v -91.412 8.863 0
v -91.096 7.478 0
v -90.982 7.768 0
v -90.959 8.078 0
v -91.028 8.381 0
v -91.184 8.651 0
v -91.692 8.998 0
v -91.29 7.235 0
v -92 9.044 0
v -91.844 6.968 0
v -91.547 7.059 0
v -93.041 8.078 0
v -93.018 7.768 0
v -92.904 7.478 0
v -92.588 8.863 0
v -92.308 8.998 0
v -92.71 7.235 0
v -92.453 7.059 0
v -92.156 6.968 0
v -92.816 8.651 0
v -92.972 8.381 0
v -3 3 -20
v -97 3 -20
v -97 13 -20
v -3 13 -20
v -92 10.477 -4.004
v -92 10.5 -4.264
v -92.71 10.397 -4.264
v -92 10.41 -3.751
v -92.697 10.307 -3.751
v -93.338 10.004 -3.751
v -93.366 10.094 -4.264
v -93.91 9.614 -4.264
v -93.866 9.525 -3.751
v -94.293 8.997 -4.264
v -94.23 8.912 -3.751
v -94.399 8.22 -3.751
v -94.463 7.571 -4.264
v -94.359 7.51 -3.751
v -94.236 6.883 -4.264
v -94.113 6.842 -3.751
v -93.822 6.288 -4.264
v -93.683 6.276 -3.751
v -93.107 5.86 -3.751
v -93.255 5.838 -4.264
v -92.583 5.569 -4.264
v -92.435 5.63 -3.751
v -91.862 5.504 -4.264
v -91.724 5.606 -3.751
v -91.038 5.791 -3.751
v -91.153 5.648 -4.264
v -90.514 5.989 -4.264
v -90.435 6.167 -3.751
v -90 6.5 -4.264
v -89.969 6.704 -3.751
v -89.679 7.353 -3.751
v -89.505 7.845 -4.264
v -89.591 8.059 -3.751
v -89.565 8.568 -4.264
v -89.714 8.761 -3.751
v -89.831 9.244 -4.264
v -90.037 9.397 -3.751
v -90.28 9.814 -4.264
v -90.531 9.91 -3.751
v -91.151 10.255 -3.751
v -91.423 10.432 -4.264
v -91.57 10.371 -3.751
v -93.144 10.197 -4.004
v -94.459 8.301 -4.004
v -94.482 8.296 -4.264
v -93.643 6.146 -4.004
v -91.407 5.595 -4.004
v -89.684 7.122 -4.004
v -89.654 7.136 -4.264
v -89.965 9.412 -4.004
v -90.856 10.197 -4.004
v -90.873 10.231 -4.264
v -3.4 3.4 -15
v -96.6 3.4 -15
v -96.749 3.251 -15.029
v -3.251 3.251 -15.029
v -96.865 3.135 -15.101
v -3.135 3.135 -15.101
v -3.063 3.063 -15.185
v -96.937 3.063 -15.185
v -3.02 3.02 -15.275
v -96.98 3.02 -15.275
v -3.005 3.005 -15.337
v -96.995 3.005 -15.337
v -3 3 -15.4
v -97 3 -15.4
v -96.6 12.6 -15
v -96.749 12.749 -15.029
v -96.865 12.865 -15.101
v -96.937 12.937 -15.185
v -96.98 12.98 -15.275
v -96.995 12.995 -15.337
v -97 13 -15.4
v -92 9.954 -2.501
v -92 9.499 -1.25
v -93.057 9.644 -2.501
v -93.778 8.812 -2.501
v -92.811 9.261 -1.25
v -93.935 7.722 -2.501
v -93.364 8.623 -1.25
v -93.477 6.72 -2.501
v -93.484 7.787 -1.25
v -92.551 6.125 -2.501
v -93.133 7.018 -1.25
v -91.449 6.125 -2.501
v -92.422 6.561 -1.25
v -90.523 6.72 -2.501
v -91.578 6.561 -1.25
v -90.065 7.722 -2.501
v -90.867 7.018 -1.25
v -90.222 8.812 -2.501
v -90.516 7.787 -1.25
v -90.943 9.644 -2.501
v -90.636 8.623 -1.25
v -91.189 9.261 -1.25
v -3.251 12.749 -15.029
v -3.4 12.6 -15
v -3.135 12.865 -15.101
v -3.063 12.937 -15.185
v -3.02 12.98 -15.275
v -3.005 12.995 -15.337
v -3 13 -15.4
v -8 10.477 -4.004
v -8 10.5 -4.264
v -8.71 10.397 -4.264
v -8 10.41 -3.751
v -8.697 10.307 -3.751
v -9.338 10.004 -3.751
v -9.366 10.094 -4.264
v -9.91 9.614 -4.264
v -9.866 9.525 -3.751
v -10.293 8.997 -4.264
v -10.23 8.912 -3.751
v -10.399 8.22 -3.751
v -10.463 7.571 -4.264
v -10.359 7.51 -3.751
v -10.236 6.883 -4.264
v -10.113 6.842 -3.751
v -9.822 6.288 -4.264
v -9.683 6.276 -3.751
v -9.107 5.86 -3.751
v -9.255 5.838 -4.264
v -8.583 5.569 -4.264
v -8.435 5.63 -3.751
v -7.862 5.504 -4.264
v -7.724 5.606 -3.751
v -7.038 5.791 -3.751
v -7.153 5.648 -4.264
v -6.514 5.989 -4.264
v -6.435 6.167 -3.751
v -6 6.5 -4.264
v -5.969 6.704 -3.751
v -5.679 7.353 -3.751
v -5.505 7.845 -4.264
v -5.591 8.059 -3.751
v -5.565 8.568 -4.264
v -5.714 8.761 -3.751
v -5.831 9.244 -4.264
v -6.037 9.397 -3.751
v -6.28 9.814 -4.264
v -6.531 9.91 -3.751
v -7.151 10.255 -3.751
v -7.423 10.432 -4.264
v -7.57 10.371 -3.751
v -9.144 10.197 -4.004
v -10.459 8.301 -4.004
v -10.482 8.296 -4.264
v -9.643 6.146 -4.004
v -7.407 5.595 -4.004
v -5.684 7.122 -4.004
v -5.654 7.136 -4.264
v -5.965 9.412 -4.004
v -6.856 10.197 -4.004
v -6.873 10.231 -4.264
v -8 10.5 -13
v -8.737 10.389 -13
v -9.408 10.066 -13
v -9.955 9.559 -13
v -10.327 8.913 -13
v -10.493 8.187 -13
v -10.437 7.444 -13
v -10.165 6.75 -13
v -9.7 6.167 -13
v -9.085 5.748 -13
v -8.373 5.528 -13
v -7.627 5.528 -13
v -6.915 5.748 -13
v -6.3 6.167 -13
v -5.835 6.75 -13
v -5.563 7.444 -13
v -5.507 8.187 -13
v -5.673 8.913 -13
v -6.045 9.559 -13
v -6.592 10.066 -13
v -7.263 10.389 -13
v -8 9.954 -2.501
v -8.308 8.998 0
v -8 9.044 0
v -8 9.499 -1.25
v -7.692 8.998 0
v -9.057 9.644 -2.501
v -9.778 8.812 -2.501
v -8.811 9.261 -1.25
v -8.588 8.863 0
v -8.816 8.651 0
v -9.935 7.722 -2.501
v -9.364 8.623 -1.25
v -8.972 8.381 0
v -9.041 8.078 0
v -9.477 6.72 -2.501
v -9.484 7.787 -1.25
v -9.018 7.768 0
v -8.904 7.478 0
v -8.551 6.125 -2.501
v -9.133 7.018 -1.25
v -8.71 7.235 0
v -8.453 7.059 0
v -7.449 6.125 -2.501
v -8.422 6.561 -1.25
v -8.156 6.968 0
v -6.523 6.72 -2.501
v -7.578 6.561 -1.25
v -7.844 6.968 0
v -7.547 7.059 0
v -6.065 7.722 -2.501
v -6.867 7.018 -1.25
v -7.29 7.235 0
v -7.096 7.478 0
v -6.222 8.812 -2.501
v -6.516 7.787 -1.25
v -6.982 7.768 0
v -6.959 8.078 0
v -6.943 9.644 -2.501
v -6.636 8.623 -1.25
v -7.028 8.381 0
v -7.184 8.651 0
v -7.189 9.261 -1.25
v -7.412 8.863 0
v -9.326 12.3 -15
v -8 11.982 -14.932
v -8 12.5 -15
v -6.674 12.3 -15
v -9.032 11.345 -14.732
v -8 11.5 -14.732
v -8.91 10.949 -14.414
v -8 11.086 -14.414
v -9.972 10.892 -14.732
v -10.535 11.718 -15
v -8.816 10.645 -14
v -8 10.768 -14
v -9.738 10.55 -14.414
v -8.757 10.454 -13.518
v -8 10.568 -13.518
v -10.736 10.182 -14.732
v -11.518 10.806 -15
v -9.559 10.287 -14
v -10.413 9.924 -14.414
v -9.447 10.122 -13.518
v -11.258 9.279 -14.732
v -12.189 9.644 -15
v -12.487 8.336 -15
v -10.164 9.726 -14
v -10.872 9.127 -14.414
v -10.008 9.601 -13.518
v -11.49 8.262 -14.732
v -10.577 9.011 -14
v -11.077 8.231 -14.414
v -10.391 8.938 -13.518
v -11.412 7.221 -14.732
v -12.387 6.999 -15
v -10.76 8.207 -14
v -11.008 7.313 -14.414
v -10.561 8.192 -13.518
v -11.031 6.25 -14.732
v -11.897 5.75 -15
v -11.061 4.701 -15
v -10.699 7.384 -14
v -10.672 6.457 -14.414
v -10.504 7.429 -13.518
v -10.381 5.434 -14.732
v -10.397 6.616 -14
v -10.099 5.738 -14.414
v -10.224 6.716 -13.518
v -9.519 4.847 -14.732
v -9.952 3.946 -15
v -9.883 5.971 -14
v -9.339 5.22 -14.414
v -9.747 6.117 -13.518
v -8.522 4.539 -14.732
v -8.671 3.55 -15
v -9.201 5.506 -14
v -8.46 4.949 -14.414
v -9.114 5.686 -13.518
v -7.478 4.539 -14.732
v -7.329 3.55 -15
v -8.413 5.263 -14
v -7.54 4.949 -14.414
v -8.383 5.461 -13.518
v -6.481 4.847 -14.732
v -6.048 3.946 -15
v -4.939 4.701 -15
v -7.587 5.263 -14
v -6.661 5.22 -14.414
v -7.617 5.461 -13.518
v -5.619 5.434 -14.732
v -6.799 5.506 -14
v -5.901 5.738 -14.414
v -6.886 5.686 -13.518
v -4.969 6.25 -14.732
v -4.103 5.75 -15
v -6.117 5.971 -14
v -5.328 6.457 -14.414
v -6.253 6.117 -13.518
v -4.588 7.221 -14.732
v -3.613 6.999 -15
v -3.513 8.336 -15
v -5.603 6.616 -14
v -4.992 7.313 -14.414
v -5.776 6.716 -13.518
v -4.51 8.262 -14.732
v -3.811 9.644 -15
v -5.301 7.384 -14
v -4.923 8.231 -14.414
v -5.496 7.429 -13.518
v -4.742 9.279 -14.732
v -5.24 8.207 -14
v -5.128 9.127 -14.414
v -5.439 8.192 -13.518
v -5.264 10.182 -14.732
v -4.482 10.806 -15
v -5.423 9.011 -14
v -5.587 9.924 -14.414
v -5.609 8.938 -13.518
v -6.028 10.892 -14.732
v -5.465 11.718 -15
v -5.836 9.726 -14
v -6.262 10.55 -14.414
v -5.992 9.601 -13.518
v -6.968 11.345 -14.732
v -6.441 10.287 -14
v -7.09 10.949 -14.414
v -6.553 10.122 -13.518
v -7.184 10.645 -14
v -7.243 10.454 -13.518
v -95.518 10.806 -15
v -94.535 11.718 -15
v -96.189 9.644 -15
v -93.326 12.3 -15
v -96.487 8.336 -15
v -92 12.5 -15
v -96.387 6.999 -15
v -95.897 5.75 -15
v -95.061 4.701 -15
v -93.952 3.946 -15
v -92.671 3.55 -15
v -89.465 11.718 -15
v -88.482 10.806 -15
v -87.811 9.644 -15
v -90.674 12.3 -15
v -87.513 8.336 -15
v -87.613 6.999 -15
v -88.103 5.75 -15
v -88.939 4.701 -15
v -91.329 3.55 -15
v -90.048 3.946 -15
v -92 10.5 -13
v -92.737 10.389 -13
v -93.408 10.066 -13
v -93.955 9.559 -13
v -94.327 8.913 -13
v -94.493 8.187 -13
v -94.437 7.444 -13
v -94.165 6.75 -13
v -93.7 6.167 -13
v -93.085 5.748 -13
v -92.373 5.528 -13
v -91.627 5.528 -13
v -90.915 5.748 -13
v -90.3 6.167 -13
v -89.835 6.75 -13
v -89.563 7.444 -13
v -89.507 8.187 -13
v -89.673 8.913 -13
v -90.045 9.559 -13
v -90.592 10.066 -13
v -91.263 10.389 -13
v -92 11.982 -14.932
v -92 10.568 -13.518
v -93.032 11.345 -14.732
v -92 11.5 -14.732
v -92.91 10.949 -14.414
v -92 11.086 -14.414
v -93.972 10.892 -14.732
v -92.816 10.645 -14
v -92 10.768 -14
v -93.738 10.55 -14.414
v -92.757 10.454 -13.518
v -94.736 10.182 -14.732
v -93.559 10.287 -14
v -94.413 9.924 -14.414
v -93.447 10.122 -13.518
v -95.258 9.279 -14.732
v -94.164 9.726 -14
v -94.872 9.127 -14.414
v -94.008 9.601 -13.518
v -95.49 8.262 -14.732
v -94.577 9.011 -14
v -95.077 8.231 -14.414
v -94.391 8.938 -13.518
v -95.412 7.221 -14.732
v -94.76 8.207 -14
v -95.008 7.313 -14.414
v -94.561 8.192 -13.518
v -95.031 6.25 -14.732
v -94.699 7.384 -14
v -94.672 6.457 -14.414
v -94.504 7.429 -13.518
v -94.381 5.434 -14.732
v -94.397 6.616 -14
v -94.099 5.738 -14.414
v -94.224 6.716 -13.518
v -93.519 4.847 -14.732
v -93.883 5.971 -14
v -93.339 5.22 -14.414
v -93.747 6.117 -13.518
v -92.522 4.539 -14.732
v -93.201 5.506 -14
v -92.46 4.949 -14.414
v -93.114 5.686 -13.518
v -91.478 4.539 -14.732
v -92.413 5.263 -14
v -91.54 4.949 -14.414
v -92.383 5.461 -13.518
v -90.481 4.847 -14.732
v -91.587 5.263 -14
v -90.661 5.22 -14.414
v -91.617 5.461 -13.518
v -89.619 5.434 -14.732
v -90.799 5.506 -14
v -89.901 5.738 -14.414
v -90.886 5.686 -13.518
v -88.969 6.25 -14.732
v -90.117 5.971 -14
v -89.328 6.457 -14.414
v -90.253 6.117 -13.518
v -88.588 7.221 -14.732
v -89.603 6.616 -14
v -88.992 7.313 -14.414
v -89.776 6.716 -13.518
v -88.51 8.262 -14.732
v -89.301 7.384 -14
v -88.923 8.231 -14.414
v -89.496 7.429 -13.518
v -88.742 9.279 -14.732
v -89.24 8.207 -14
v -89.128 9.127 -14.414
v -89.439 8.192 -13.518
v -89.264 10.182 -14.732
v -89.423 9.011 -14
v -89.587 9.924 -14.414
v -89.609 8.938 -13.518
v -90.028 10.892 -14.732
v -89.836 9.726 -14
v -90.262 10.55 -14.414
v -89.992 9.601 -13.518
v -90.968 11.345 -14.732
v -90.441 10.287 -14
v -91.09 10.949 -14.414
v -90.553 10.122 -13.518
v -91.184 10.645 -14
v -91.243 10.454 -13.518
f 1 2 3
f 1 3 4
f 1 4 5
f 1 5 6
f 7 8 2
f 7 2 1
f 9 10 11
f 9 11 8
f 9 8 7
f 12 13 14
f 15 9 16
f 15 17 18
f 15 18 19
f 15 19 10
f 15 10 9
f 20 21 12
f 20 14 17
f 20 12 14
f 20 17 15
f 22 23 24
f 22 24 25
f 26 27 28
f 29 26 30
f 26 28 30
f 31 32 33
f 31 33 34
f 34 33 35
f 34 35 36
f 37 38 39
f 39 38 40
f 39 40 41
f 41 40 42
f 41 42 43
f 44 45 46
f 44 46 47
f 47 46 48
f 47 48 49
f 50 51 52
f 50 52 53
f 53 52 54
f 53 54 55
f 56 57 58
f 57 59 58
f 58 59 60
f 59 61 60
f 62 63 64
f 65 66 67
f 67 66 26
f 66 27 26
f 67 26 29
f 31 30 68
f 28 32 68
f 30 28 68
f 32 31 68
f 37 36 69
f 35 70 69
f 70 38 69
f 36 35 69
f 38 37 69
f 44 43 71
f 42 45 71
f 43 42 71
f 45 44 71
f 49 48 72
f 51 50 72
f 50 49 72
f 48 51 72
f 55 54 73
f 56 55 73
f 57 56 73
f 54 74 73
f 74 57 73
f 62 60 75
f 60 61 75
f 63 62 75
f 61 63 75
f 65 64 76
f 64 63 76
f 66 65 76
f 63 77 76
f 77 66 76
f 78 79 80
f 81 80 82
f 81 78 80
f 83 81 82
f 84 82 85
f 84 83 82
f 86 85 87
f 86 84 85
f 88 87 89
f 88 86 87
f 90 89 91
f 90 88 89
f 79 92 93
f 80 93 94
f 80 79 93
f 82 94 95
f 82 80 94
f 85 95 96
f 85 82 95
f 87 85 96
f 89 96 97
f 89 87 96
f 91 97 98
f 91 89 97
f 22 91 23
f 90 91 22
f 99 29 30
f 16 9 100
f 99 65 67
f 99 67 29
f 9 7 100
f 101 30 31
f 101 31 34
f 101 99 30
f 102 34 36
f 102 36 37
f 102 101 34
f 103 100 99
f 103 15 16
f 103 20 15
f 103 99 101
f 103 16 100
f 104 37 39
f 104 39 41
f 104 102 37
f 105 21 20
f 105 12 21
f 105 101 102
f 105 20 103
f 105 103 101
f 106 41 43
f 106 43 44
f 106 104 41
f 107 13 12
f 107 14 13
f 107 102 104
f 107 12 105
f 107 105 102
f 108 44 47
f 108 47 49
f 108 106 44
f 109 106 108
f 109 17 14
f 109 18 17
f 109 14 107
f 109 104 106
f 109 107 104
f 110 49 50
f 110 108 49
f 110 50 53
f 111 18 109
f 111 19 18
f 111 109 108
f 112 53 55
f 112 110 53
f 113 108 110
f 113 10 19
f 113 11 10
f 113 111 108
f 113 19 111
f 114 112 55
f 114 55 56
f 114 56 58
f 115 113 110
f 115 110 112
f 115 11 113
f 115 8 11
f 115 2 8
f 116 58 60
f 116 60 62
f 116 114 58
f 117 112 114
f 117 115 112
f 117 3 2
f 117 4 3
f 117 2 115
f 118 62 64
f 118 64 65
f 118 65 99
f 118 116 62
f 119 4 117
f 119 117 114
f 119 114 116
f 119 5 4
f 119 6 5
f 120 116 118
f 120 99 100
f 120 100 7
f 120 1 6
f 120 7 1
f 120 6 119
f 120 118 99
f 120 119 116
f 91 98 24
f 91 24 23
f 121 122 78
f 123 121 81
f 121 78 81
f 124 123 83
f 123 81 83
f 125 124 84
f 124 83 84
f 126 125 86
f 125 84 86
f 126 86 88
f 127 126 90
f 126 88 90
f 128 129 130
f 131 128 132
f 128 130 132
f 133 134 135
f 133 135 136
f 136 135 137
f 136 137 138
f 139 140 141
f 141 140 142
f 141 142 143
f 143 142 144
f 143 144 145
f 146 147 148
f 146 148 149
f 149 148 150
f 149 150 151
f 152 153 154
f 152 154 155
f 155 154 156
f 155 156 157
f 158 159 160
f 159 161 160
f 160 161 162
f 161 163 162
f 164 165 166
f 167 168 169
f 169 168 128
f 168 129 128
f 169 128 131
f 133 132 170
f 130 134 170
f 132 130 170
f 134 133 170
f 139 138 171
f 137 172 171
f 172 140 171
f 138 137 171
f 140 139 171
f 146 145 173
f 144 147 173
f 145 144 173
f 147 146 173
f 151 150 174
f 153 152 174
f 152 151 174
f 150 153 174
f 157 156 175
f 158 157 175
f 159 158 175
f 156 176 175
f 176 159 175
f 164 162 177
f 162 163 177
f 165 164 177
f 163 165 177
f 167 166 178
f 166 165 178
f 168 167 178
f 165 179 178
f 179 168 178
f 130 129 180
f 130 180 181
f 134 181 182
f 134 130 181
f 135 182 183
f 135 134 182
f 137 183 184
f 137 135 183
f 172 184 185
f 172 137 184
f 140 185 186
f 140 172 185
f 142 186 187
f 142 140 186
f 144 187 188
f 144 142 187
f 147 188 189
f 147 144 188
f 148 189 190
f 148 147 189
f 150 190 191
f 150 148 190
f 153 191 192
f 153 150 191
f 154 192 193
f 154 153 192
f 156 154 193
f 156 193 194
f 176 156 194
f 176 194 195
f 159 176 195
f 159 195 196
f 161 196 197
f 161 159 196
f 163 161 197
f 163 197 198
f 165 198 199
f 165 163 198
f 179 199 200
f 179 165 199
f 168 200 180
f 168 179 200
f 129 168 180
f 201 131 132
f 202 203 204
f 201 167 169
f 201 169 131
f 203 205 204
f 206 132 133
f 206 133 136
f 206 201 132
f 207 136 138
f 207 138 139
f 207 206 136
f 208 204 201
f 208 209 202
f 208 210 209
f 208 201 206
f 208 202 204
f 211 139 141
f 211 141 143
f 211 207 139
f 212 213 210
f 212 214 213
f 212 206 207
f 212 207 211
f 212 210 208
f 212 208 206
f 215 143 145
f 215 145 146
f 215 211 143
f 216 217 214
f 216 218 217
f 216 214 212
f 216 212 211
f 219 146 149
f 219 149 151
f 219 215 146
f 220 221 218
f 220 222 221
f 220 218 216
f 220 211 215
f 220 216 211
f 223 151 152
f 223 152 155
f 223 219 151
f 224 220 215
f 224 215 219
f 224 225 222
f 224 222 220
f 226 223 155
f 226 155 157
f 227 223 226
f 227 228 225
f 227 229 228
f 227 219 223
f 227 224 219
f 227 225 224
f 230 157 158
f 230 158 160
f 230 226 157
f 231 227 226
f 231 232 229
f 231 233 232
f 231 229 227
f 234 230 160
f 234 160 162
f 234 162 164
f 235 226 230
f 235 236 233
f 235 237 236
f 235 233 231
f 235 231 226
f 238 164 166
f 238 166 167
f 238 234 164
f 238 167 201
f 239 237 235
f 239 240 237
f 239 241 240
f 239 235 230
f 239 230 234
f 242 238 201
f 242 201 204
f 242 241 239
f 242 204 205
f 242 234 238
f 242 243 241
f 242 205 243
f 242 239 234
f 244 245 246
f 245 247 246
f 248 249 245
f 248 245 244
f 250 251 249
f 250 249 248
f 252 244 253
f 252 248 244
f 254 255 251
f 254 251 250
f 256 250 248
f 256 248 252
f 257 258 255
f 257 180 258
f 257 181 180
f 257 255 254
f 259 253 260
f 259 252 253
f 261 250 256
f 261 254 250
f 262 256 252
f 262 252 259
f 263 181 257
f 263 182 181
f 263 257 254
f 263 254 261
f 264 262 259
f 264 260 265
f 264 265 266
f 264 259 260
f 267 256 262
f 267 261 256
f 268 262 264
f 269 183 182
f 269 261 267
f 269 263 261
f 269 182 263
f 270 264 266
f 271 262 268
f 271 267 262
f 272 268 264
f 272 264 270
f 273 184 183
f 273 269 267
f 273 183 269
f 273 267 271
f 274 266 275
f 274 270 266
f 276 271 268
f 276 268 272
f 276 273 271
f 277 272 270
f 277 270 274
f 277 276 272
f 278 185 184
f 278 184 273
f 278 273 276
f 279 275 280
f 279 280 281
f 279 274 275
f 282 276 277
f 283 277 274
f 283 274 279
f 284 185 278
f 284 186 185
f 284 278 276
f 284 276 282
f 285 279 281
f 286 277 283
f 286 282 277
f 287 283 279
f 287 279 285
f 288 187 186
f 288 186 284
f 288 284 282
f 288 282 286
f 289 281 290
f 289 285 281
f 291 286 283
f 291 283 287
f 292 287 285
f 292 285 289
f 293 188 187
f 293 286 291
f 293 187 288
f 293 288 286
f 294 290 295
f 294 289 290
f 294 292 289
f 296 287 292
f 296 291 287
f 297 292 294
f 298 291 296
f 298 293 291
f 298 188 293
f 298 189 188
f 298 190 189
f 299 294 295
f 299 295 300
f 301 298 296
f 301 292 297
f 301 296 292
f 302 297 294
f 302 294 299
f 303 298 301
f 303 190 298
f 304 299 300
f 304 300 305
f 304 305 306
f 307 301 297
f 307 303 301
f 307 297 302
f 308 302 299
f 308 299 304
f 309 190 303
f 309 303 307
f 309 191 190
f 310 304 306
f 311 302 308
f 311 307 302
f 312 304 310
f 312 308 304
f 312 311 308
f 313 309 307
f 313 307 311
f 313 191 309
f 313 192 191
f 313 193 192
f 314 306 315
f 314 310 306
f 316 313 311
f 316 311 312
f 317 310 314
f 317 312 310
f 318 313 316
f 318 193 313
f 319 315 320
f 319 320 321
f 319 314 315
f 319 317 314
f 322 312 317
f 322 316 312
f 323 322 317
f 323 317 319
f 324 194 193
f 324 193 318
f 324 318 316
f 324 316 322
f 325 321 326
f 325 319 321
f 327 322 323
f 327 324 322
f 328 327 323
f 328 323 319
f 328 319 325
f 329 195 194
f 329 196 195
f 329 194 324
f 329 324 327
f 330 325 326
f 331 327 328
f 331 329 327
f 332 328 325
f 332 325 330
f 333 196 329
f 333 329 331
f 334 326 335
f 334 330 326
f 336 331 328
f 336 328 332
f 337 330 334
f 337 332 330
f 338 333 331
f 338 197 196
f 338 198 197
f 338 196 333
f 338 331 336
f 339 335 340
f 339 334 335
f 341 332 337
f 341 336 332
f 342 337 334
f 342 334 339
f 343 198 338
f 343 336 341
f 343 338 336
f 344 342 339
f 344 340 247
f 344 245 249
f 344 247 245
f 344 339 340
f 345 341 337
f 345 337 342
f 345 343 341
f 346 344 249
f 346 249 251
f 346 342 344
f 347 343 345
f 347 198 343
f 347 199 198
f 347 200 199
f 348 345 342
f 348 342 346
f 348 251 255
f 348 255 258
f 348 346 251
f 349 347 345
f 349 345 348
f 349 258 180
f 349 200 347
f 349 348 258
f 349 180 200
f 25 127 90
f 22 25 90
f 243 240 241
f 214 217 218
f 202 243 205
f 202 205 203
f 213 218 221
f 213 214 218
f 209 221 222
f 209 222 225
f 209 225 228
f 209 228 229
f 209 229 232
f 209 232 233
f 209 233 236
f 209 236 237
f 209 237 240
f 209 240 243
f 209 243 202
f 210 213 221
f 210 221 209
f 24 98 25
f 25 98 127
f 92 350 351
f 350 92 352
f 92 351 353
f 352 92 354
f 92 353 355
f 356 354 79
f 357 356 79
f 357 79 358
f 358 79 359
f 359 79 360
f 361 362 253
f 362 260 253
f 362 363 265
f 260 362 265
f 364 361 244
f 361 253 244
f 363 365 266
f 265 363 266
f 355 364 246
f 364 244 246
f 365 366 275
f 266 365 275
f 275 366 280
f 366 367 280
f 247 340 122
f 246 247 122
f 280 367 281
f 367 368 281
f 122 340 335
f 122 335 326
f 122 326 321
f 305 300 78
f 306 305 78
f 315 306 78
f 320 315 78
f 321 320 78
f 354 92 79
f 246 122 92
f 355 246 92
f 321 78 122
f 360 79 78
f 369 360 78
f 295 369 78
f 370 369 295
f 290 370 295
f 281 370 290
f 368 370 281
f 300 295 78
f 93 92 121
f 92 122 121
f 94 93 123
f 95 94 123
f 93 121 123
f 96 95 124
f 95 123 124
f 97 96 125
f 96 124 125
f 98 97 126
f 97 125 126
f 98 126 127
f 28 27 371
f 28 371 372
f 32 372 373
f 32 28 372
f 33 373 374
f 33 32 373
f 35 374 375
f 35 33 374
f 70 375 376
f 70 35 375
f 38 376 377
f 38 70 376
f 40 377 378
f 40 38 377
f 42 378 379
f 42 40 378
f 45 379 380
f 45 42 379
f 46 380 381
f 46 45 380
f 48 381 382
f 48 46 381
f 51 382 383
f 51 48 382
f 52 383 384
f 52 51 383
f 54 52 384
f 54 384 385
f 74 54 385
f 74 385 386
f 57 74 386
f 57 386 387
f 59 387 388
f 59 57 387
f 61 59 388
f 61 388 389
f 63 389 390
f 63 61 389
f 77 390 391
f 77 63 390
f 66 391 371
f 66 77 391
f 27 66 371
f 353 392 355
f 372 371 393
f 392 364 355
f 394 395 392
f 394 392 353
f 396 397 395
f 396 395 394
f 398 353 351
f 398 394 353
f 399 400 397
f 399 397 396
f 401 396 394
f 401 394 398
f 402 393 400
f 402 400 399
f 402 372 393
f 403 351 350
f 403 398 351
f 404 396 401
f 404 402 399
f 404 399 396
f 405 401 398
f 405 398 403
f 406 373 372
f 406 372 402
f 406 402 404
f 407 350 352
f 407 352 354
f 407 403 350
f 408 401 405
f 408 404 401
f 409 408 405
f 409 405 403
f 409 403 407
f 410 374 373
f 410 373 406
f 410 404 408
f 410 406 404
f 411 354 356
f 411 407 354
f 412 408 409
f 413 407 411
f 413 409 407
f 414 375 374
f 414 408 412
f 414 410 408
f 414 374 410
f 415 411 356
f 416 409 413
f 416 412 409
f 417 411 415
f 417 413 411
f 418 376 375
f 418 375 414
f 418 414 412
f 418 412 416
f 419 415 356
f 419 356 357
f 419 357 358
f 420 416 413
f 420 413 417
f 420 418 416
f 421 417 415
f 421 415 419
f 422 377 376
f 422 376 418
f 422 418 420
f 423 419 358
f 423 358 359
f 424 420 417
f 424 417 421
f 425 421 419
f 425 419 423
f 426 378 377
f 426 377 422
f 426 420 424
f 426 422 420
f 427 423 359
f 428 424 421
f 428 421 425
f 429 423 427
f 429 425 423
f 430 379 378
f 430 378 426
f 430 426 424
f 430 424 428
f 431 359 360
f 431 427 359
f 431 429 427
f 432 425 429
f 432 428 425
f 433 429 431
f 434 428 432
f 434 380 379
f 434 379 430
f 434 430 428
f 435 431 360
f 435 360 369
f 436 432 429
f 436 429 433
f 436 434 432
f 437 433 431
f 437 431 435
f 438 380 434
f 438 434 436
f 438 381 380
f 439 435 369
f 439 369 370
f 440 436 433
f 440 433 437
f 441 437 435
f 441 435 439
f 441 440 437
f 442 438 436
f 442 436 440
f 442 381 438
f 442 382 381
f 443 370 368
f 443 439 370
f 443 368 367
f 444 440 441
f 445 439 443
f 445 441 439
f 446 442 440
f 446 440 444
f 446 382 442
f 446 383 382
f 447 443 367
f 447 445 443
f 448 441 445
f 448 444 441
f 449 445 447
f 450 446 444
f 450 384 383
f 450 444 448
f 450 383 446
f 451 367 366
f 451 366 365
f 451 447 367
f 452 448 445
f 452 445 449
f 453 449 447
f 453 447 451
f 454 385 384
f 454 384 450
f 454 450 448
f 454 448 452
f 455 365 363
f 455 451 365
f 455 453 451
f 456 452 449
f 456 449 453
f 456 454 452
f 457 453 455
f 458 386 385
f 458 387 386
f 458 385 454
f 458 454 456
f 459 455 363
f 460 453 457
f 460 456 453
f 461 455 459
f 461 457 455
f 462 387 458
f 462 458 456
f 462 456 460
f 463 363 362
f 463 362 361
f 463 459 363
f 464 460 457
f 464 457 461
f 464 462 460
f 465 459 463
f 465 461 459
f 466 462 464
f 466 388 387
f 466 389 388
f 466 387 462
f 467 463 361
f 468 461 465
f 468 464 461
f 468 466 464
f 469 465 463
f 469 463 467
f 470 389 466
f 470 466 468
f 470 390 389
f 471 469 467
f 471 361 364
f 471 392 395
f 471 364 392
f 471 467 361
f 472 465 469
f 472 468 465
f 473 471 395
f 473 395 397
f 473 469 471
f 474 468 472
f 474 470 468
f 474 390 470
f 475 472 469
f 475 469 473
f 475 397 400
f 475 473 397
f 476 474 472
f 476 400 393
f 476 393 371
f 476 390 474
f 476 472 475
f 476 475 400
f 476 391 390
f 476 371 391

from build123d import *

# Parameters (mm, degrees)
SKETCH2_R             = 2.5
BOSS_EXTRUDE1_DEPTH   = 15
BOSS_EXTRUDE1_2_DEPTH = 15
SKETCH3_W             = 94
SKETCH3_H             = 10
BOSS_EXTRUDE2_DEPTH   = 5
FILLET1_R             = 2
FILLET2_R             = 0.4
CHAMFER1_SIZE         = 4
CHAMFER1_SIZE2        = 1.455880937
CHAMFER1_PART_2_SIZE  = 4
CHAMFER1_PART_2_SIZE2 = 1.455880937
FILLET4_R             = 1.5


with BuildPart() as part:
    # Sketch2 → Boss-Extrude1 (new body)
    with BuildSketch(Plane(origin=(0, 0, 0), x_dir=(0, 1, 0), z_dir=(0, 0, 1))):
        with Locations((8, 92)):
            Circle(SKETCH2_R)
    extrude(amount=-BOSS_EXTRUDE1_DEPTH)



with BuildPart() as body_2:
    # Sketch2 → Boss-Extrude1 2 (new body)
    with BuildSketch(Plane(origin=(0, 0, 0), x_dir=(0, 1, 0), z_dir=(0, 0, 1))):
        with Locations((8, 8)):
            Circle(SKETCH2_R)
    extrude(amount=-BOSS_EXTRUDE1_2_DEPTH)


with BuildPart() as part_1:
    add(part.part)

    add(body_2.part)  # Boss-Extrude2 merges body 2
    # Sketch3 → Boss-Extrude2 (add)
    with BuildSketch(Plane(origin=(0, 0, -15), x_dir=(1, 0, 0), z_dir=(0, 0, -1))):
        with Locations((-50, -8)):
            Rectangle(SKETCH3_W, SKETCH3_H)
    extrude(amount=BOSS_EXTRUDE2_DEPTH)

    # Fillet1
    fillet1_edges = [part_1.edges().sort_by_distance(p)[0] for p in [
        (-8, 5.5, -15),
        (-92, 5.5, -15),
    ]]
    fillet(fillet1_edges, radius=FILLET1_R)

    # Fillet2
    fillet2_edges = [part_1.edges().sort_by_distance(p)[0] for p in [
        (-97, 8, -15),
        (-50, 13, -15),
        (-3, 8, -15),
        (-50, 3, -15),
    ]]
    fillet(fillet2_edges, radius=FILLET2_R)

    # Chamfer1
    chamfer1_edges = [part_1.edges().sort_by_distance(p)[0] for p in [
        (-8, 5.5, 0),
    ]]
    chamfer1_side = [part_1.faces().sort_by_distance(p)[0] for p in [
        (-8, 5.5, -6.5),
    ]]
    chamfer(chamfer1_edges, length=CHAMFER1_SIZE, length2=CHAMFER1_SIZE2, reference=chamfer1_side[0])

    # Chamfer1 part 2
    chamfer1_part_2_edges = [part_1.edges().sort_by_distance(p)[0] for p in [
        (-92, 5.5, 0),
    ]]
    chamfer1_part_2_side = [part_1.faces().sort_by_distance(p)[0] for p in [
        (-92, 5.5, -6.5),
    ]]
    chamfer(chamfer1_part_2_edges, length=CHAMFER1_PART_2_SIZE, length2=CHAMFER1_PART_2_SIZE2, reference=chamfer1_part_2_side[0])

    # Fillet4
    fillet4_edges = [part_1.edges().sort_by_distance(p)[0] for p in [
        (-8, 5.5, -4),
        (-92, 5.5, -4),
    ]]
    fillet(fillet4_edges, radius=FILLET4_R)


solid = part_1.part
